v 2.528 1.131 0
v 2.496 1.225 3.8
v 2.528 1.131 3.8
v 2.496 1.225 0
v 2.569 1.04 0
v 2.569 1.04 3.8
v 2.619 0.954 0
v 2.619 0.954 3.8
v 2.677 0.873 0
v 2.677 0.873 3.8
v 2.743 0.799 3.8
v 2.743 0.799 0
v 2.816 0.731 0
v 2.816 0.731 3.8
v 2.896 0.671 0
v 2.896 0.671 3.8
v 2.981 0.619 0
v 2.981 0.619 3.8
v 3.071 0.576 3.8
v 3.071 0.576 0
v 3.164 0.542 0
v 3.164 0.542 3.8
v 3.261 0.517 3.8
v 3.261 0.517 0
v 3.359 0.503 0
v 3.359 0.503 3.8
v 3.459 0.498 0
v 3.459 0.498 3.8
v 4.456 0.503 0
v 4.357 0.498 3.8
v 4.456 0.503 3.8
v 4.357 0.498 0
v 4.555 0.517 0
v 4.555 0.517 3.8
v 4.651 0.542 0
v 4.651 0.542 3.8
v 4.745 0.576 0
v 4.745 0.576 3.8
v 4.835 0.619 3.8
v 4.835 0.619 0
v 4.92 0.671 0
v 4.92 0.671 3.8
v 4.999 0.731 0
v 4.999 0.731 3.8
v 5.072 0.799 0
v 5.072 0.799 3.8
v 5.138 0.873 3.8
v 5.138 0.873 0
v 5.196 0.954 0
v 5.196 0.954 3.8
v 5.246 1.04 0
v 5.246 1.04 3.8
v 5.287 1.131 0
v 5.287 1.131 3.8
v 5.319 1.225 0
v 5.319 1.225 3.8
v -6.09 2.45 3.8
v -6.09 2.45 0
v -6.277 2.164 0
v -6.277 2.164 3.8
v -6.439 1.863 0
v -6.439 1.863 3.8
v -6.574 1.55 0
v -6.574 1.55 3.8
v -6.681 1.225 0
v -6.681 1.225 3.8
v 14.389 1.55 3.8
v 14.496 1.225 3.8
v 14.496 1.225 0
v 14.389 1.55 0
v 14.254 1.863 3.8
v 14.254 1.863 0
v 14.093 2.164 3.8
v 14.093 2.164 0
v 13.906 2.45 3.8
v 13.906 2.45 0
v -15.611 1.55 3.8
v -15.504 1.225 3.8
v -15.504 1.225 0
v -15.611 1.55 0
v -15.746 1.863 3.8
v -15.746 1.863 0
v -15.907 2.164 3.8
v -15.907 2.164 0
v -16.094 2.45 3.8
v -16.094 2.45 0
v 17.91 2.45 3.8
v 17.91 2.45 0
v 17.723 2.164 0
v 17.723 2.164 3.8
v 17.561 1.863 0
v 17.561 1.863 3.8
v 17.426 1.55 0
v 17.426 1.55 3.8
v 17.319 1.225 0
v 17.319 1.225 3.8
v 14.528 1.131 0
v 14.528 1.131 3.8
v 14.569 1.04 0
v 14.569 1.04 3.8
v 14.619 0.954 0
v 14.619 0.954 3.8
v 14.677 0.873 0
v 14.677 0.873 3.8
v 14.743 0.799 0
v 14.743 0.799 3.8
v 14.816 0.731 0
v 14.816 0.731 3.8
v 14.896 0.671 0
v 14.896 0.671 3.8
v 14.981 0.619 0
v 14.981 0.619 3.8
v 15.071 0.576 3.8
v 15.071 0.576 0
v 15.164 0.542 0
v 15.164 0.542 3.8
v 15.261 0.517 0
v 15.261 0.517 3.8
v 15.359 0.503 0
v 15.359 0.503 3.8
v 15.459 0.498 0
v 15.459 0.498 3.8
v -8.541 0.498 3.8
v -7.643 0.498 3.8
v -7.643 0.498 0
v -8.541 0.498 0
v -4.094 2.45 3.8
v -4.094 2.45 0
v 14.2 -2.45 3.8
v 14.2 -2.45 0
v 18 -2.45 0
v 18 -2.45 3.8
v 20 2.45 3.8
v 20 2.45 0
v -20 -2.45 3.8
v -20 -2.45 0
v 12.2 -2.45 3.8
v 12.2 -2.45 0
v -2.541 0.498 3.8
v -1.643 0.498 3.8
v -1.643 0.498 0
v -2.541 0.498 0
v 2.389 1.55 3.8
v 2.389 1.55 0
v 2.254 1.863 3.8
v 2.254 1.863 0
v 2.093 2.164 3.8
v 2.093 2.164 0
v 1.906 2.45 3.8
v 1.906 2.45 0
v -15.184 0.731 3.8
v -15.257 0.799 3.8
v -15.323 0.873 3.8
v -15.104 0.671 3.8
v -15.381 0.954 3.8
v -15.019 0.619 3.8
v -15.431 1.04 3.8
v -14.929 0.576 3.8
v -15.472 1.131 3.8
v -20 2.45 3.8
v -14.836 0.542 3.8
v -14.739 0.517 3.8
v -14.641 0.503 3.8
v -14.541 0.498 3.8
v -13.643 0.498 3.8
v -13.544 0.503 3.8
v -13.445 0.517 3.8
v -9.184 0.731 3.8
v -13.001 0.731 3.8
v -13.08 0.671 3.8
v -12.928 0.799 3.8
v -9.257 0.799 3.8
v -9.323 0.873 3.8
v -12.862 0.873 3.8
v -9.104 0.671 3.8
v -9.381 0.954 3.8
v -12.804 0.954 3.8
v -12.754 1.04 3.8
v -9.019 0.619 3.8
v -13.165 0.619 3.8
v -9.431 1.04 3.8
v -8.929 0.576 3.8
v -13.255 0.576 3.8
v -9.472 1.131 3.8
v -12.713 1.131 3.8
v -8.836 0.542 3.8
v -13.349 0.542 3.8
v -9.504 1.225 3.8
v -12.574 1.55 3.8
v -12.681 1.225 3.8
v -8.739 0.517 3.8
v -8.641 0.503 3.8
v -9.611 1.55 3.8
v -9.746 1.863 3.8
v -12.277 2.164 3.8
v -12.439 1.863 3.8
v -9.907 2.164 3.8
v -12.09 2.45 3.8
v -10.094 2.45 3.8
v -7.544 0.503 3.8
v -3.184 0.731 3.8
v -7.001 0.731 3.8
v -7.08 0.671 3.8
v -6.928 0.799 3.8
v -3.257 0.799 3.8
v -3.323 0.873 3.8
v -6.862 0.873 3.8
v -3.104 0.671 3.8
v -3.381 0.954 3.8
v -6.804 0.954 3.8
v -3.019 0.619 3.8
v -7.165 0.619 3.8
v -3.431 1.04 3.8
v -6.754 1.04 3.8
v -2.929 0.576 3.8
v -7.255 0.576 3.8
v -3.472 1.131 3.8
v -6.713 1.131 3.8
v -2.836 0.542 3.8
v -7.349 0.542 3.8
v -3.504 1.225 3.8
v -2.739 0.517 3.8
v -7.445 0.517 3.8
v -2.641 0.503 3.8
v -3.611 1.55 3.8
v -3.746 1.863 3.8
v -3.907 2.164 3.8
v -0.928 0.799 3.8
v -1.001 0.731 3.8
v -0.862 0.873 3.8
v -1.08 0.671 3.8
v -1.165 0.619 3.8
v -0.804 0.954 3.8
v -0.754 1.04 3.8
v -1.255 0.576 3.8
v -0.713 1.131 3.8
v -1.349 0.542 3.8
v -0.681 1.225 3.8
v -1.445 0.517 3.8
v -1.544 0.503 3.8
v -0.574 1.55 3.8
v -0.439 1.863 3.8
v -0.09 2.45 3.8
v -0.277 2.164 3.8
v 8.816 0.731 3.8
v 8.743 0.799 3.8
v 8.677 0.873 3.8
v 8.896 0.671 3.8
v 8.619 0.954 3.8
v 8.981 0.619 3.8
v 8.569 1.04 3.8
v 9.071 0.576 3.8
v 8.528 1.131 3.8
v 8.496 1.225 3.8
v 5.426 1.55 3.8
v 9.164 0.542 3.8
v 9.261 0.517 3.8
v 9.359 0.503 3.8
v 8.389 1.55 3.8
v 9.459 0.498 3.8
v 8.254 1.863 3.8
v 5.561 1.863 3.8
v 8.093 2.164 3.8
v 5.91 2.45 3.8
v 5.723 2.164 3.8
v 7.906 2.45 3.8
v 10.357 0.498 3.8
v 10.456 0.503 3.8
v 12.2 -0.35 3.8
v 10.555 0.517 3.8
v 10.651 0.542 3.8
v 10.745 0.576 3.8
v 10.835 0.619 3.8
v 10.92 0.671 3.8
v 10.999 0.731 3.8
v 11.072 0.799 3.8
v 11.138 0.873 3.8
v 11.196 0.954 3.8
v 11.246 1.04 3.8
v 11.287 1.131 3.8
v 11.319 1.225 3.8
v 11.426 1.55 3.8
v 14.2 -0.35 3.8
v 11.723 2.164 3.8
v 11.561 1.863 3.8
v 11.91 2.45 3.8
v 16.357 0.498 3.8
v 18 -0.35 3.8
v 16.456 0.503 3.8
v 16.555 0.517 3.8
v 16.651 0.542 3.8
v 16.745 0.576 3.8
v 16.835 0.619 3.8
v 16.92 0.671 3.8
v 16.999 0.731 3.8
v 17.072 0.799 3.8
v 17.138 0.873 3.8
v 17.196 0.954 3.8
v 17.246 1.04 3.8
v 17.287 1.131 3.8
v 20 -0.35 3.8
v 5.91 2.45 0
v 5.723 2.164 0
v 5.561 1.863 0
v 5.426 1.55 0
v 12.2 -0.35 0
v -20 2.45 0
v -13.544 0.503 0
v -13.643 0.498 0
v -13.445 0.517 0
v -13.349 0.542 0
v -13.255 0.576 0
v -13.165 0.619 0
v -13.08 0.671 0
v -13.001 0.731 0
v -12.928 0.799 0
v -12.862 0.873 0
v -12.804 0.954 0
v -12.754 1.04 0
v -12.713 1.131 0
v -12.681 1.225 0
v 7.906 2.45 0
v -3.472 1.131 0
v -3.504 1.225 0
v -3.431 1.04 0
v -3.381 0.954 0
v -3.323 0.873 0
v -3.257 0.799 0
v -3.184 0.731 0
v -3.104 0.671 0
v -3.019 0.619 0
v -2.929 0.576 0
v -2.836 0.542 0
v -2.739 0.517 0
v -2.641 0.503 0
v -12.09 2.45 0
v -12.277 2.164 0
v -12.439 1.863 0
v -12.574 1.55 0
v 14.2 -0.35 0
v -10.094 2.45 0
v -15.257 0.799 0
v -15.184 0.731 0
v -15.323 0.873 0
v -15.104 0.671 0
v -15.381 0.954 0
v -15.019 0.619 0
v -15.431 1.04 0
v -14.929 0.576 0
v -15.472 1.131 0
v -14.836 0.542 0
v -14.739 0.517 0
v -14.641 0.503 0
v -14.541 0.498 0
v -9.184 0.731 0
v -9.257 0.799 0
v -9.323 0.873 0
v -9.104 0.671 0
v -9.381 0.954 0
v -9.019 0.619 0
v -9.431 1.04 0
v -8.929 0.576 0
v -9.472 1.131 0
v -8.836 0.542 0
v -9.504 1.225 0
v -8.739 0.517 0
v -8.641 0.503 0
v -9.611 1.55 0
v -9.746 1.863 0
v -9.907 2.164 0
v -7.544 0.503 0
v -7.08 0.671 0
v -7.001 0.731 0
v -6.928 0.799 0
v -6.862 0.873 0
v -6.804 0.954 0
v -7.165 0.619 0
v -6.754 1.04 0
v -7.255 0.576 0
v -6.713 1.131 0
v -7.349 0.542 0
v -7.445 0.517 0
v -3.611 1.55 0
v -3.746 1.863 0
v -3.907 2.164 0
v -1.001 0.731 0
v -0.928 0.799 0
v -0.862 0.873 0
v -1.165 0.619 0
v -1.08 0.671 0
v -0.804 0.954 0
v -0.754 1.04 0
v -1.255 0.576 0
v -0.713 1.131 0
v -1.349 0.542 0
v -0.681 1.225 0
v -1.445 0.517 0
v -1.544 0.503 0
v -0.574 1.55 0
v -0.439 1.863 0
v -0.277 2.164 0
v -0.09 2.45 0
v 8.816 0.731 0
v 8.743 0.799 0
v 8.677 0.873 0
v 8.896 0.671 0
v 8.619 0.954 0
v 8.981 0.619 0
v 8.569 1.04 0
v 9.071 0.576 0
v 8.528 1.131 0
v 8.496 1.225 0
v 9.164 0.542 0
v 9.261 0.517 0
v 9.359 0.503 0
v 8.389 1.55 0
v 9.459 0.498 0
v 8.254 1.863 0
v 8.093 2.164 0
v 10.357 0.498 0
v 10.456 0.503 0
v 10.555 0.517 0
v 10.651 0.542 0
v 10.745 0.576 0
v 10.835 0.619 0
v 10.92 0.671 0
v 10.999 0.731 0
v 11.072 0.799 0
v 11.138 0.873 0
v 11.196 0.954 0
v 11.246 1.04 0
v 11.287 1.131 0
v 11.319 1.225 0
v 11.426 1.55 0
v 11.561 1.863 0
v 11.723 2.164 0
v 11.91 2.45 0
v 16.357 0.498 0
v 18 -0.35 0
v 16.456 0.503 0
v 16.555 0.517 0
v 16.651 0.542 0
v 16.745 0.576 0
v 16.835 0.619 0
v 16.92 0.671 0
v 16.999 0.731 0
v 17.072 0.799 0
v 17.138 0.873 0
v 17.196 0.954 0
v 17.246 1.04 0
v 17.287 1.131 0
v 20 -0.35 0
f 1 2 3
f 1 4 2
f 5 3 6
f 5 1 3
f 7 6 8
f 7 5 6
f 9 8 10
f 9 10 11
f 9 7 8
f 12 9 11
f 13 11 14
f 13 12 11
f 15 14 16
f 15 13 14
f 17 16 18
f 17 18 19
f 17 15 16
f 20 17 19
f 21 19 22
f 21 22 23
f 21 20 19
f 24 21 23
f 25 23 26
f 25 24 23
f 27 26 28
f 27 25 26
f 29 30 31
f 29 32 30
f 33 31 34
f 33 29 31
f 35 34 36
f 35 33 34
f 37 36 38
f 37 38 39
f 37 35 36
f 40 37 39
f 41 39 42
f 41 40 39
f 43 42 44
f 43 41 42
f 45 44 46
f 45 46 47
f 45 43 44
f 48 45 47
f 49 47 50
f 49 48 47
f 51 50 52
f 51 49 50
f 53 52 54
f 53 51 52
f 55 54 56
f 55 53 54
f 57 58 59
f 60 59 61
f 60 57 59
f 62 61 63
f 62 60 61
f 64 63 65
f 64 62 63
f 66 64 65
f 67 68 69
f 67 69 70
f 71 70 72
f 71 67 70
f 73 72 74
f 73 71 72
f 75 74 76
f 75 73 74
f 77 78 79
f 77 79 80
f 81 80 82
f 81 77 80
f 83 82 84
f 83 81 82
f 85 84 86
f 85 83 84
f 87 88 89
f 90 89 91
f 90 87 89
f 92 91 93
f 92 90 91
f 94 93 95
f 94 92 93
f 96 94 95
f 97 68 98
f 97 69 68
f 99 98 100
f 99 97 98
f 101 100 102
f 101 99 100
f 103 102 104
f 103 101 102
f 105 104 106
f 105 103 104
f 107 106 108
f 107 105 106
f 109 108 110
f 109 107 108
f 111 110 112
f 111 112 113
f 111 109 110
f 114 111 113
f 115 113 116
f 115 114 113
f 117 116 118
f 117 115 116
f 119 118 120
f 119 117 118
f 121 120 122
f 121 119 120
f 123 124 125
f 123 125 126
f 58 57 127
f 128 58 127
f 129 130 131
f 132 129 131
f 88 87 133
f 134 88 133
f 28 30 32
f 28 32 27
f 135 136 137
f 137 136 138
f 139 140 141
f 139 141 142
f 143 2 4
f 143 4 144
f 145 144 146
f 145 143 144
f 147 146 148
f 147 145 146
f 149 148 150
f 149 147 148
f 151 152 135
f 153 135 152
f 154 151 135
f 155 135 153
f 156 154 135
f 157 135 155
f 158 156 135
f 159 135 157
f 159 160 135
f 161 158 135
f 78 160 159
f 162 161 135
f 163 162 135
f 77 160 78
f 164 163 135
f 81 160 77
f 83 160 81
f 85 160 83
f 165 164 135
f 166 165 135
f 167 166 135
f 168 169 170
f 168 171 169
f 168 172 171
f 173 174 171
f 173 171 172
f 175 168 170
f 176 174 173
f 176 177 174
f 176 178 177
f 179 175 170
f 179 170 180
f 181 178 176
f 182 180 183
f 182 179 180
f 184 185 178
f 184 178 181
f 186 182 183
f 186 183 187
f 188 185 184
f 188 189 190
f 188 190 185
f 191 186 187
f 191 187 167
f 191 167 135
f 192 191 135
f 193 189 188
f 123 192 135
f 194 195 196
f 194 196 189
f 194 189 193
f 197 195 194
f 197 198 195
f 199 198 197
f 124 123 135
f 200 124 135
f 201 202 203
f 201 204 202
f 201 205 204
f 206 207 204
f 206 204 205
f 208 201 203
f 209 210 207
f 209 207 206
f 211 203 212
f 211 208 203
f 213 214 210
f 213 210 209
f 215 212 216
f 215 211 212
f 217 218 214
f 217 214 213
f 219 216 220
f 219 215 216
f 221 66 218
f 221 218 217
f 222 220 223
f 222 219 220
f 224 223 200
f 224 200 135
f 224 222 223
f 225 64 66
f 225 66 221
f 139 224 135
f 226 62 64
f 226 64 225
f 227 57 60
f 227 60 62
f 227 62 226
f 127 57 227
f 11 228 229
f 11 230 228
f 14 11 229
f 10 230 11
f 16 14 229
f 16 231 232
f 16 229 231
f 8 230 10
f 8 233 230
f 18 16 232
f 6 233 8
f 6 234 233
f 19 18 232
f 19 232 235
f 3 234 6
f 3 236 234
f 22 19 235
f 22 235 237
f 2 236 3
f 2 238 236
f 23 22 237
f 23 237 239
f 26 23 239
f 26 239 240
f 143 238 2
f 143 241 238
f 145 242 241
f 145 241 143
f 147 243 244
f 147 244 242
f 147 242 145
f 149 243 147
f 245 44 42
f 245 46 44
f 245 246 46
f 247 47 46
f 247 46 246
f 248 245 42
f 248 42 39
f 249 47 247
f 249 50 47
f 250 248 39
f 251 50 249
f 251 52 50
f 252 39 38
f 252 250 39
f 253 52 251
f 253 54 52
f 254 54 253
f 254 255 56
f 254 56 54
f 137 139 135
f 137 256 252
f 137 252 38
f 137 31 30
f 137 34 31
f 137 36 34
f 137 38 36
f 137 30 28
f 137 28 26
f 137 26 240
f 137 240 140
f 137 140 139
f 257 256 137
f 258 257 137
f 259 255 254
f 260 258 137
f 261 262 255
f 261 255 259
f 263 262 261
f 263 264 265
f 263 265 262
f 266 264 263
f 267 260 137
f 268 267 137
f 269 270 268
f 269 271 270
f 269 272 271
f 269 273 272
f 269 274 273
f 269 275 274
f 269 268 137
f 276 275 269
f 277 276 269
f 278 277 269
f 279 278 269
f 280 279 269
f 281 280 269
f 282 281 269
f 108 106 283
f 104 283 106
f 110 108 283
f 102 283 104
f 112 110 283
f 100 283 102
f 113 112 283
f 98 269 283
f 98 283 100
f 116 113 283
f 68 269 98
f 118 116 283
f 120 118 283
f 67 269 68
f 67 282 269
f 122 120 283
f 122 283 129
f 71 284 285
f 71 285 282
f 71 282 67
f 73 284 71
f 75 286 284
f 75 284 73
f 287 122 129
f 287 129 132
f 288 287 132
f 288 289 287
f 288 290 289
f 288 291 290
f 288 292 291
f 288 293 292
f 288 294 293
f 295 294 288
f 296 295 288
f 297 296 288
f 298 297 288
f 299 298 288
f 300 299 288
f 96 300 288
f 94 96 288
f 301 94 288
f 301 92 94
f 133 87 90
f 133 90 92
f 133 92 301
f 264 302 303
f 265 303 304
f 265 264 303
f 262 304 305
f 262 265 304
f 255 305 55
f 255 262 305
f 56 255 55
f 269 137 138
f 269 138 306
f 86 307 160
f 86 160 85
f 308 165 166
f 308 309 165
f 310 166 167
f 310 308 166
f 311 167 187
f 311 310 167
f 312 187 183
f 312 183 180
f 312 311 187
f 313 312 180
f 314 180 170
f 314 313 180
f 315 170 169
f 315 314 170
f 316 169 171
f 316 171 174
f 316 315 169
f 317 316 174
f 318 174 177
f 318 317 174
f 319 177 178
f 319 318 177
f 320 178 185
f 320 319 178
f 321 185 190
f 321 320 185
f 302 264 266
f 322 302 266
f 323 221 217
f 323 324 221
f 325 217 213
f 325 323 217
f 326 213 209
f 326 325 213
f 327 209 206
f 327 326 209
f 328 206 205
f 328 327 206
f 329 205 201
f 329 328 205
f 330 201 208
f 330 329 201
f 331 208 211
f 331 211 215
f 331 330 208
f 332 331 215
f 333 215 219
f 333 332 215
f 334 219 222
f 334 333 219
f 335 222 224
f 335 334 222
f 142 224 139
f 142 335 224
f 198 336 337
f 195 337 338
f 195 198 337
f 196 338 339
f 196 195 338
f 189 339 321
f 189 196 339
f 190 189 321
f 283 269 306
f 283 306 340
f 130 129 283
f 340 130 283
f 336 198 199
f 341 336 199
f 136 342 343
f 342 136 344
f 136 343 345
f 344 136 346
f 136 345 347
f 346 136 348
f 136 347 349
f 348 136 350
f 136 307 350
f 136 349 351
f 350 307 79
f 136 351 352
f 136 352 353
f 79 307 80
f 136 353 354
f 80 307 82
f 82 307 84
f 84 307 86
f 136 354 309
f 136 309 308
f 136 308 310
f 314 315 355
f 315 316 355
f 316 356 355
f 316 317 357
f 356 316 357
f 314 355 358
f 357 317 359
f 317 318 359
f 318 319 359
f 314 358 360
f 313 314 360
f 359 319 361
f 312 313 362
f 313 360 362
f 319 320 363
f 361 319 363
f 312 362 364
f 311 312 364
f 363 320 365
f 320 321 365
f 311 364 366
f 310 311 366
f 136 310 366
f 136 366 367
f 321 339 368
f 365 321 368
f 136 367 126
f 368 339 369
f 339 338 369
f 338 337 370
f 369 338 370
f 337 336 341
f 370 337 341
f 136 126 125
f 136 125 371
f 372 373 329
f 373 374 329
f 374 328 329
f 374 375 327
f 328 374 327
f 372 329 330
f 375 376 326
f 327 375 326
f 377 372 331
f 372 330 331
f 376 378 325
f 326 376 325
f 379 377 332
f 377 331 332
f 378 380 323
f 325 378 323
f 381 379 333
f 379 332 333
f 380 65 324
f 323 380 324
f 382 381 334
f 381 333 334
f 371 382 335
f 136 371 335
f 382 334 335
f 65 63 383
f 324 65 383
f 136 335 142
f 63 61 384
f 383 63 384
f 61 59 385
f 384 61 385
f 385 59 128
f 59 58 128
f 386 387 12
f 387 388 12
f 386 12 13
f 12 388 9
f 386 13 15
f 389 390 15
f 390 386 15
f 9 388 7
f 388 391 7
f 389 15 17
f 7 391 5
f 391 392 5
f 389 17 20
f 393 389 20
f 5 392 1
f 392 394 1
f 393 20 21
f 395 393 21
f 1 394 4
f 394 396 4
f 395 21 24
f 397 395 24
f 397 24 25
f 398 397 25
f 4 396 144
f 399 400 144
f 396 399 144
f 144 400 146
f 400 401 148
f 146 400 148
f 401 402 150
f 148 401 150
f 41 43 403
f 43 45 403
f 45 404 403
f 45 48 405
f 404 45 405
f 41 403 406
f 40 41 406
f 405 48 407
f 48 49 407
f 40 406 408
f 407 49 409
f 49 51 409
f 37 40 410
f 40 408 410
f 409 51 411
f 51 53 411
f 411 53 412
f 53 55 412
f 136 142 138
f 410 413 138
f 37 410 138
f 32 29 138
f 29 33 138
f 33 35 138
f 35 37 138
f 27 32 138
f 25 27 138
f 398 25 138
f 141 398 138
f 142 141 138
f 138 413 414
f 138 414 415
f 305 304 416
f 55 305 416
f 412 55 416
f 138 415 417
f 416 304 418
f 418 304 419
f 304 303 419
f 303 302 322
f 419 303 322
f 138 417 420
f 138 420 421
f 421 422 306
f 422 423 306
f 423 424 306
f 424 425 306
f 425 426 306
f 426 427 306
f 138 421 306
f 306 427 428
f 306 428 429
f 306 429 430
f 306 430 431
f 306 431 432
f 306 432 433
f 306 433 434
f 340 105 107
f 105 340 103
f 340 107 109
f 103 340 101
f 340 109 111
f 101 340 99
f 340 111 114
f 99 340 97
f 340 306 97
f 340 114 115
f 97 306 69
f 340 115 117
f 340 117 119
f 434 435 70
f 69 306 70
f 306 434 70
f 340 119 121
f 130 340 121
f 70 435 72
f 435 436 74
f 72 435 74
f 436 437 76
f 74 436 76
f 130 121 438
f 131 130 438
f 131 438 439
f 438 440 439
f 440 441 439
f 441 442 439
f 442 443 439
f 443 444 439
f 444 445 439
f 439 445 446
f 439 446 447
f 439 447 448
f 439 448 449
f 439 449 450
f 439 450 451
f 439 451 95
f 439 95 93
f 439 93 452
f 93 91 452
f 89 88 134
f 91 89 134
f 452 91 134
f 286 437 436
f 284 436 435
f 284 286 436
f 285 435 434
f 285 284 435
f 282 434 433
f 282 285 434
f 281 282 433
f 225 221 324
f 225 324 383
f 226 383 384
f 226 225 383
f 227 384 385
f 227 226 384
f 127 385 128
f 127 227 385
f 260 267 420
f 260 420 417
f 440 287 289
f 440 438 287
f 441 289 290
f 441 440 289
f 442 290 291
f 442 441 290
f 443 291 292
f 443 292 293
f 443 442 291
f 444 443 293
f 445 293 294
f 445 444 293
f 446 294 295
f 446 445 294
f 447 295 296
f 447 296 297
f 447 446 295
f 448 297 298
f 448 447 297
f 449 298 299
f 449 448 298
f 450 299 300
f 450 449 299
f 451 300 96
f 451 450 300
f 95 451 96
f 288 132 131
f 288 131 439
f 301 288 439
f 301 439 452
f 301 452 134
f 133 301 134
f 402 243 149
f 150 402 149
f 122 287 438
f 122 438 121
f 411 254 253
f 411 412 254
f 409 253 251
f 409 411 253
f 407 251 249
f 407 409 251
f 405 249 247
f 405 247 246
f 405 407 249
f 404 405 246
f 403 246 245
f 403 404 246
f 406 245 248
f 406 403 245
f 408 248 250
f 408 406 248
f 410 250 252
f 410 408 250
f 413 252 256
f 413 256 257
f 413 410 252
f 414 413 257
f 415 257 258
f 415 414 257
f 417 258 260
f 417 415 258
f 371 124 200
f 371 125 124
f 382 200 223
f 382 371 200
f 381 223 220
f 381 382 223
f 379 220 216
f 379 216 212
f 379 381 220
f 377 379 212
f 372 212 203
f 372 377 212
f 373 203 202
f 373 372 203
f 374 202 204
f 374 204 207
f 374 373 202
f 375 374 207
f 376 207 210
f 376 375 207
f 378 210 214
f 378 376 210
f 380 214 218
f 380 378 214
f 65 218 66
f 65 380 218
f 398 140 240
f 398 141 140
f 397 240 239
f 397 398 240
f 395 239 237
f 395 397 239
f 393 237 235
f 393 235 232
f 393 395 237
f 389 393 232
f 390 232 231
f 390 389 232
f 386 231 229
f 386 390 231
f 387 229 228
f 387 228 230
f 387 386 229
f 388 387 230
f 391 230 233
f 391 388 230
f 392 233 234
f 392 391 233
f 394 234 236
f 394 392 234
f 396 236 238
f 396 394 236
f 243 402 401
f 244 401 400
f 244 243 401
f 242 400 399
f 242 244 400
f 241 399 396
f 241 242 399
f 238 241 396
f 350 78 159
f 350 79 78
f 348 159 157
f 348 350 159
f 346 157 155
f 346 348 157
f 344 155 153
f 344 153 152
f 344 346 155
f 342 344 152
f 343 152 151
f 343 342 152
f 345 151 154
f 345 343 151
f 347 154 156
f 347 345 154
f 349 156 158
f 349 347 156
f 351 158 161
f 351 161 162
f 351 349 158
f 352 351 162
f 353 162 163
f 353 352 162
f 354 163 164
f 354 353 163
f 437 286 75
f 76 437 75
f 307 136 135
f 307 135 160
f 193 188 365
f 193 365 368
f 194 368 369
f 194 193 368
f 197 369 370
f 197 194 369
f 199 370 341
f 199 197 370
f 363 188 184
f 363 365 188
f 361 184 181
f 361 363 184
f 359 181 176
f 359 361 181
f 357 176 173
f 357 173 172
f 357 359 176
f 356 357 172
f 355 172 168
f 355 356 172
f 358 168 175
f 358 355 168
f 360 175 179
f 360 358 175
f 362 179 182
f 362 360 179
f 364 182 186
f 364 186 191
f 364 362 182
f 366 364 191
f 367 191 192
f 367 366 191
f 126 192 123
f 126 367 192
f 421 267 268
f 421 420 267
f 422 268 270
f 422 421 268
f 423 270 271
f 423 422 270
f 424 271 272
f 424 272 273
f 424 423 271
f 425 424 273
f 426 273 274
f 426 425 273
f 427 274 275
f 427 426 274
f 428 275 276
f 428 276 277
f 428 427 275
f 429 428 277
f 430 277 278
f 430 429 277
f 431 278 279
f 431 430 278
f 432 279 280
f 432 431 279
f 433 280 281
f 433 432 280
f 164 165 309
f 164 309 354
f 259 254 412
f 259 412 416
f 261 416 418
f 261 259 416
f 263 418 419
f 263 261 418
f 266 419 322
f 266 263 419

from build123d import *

# Parameters (mm, degrees)
CROQUIS4_W              = 40
CROQUIS4_H              = 4.9
SALIENTE_EXTRUIR1_DEPTH = 3.8
CORTAR_EXTRUIR1_DEPTH   = 5
REDONDEO1_R             = 1
MATRIZL1_COUNT          = 6
MATRIZL1_PITCH          = 6
REDONDEO1_OF_MATRIZL1_R = 1
CROQUIS7_W              = 2
CROQUIS7_H              = 4.2
CORTAR_EXTRUIR2_DEPTH   = 10


with BuildPart() as part:
    # Croquis4 → Saliente-Extruir1 (new body)
    with BuildSketch(Plane.XY):
        Rectangle(CROQUIS4_W, CROQUIS4_H)
    extrude(amount=SALIENTE_EXTRUIR1_DEPTH)

    # Croquis5 → Cortar-Extruir1 (cut)
    with BuildSketch(Plane.XY.offset(3.8)):
        with BuildLine():
            Line((-16.122428878, 2.488752454), (-12.062122986, 2.488752454))
            ThreePointArc((-12.062122986, 2.488752454), (-12.575562017, 1.545062529), (-12.814503922, 0.497648057))
            Line((-12.814503922, 0.497648057), (-15.370047942, 0.497648057))
            ThreePointArc((-15.370047942, 0.497648057), (-15.608989847, 1.545062529), (-16.122428878, 2.488752454))
        make_face()
    cortar_extruir1 = extrude(amount=-CORTAR_EXTRUIR1_DEPTH, mode=Mode.SUBTRACT)

    # Redondeo1
    redondeo1_edges = [part.edges().sort_by_distance(p)[0] for p in [
        (-12.814503922, 0.497648057, 1.9),
        (-15.370047942, 0.497648057, 1.9),
    ]]
    fillet(redondeo1_edges, radius=REDONDEO1_R)

    # MatrizL1: Cortar-Extruir1 ×6
    with Locations(*[(i * MATRIZL1_PITCH, 0, 0) for i in range(1, MATRIZL1_COUNT)]):
        add(cortar_extruir1, mode=Mode.SUBTRACT)

    # Redondeo1 of MatrizL1
    redondeo1_of_matrizl1_edges = [part.edges().sort_by_distance(p)[0] for p in [
        (-6.814503922, 0.497648057, 1.9),
        (-9.370047942, 0.497648057, 1.9),
        (-0.814503922, 0.497648057, 1.9),
        (-3.370047942, 0.497648057, 1.9),
        (5.185496078, 0.497648057, 1.9),
        (2.629952058, 0.497648057, 1.9),
        (11.185496078, 0.497648057, 1.9),
        (8.629952058, 0.497648057, 1.9),
        (17.185496078, 0.497648057, 1.9),
        (14.629952058, 0.497648057, 1.9),
    ]]
    fillet(redondeo1_of_matrizl1_edges, radius=REDONDEO1_OF_MATRIZL1_R)

    # Croquis7 → Cortar-Extruir2 (cut)
    with BuildSketch(Plane.XY.offset(3.8)):
        with Locations((19, -2.45)):
            Rectangle(CROQUIS7_W, CROQUIS7_H)
        with Locations((13.2, -2.45)):
            Rectangle(CROQUIS7_W, CROQUIS7_H)
    extrude(amount=-CORTAR_EXTRUIR2_DEPTH, mode=Mode.SUBTRACT)


solid = part.part
